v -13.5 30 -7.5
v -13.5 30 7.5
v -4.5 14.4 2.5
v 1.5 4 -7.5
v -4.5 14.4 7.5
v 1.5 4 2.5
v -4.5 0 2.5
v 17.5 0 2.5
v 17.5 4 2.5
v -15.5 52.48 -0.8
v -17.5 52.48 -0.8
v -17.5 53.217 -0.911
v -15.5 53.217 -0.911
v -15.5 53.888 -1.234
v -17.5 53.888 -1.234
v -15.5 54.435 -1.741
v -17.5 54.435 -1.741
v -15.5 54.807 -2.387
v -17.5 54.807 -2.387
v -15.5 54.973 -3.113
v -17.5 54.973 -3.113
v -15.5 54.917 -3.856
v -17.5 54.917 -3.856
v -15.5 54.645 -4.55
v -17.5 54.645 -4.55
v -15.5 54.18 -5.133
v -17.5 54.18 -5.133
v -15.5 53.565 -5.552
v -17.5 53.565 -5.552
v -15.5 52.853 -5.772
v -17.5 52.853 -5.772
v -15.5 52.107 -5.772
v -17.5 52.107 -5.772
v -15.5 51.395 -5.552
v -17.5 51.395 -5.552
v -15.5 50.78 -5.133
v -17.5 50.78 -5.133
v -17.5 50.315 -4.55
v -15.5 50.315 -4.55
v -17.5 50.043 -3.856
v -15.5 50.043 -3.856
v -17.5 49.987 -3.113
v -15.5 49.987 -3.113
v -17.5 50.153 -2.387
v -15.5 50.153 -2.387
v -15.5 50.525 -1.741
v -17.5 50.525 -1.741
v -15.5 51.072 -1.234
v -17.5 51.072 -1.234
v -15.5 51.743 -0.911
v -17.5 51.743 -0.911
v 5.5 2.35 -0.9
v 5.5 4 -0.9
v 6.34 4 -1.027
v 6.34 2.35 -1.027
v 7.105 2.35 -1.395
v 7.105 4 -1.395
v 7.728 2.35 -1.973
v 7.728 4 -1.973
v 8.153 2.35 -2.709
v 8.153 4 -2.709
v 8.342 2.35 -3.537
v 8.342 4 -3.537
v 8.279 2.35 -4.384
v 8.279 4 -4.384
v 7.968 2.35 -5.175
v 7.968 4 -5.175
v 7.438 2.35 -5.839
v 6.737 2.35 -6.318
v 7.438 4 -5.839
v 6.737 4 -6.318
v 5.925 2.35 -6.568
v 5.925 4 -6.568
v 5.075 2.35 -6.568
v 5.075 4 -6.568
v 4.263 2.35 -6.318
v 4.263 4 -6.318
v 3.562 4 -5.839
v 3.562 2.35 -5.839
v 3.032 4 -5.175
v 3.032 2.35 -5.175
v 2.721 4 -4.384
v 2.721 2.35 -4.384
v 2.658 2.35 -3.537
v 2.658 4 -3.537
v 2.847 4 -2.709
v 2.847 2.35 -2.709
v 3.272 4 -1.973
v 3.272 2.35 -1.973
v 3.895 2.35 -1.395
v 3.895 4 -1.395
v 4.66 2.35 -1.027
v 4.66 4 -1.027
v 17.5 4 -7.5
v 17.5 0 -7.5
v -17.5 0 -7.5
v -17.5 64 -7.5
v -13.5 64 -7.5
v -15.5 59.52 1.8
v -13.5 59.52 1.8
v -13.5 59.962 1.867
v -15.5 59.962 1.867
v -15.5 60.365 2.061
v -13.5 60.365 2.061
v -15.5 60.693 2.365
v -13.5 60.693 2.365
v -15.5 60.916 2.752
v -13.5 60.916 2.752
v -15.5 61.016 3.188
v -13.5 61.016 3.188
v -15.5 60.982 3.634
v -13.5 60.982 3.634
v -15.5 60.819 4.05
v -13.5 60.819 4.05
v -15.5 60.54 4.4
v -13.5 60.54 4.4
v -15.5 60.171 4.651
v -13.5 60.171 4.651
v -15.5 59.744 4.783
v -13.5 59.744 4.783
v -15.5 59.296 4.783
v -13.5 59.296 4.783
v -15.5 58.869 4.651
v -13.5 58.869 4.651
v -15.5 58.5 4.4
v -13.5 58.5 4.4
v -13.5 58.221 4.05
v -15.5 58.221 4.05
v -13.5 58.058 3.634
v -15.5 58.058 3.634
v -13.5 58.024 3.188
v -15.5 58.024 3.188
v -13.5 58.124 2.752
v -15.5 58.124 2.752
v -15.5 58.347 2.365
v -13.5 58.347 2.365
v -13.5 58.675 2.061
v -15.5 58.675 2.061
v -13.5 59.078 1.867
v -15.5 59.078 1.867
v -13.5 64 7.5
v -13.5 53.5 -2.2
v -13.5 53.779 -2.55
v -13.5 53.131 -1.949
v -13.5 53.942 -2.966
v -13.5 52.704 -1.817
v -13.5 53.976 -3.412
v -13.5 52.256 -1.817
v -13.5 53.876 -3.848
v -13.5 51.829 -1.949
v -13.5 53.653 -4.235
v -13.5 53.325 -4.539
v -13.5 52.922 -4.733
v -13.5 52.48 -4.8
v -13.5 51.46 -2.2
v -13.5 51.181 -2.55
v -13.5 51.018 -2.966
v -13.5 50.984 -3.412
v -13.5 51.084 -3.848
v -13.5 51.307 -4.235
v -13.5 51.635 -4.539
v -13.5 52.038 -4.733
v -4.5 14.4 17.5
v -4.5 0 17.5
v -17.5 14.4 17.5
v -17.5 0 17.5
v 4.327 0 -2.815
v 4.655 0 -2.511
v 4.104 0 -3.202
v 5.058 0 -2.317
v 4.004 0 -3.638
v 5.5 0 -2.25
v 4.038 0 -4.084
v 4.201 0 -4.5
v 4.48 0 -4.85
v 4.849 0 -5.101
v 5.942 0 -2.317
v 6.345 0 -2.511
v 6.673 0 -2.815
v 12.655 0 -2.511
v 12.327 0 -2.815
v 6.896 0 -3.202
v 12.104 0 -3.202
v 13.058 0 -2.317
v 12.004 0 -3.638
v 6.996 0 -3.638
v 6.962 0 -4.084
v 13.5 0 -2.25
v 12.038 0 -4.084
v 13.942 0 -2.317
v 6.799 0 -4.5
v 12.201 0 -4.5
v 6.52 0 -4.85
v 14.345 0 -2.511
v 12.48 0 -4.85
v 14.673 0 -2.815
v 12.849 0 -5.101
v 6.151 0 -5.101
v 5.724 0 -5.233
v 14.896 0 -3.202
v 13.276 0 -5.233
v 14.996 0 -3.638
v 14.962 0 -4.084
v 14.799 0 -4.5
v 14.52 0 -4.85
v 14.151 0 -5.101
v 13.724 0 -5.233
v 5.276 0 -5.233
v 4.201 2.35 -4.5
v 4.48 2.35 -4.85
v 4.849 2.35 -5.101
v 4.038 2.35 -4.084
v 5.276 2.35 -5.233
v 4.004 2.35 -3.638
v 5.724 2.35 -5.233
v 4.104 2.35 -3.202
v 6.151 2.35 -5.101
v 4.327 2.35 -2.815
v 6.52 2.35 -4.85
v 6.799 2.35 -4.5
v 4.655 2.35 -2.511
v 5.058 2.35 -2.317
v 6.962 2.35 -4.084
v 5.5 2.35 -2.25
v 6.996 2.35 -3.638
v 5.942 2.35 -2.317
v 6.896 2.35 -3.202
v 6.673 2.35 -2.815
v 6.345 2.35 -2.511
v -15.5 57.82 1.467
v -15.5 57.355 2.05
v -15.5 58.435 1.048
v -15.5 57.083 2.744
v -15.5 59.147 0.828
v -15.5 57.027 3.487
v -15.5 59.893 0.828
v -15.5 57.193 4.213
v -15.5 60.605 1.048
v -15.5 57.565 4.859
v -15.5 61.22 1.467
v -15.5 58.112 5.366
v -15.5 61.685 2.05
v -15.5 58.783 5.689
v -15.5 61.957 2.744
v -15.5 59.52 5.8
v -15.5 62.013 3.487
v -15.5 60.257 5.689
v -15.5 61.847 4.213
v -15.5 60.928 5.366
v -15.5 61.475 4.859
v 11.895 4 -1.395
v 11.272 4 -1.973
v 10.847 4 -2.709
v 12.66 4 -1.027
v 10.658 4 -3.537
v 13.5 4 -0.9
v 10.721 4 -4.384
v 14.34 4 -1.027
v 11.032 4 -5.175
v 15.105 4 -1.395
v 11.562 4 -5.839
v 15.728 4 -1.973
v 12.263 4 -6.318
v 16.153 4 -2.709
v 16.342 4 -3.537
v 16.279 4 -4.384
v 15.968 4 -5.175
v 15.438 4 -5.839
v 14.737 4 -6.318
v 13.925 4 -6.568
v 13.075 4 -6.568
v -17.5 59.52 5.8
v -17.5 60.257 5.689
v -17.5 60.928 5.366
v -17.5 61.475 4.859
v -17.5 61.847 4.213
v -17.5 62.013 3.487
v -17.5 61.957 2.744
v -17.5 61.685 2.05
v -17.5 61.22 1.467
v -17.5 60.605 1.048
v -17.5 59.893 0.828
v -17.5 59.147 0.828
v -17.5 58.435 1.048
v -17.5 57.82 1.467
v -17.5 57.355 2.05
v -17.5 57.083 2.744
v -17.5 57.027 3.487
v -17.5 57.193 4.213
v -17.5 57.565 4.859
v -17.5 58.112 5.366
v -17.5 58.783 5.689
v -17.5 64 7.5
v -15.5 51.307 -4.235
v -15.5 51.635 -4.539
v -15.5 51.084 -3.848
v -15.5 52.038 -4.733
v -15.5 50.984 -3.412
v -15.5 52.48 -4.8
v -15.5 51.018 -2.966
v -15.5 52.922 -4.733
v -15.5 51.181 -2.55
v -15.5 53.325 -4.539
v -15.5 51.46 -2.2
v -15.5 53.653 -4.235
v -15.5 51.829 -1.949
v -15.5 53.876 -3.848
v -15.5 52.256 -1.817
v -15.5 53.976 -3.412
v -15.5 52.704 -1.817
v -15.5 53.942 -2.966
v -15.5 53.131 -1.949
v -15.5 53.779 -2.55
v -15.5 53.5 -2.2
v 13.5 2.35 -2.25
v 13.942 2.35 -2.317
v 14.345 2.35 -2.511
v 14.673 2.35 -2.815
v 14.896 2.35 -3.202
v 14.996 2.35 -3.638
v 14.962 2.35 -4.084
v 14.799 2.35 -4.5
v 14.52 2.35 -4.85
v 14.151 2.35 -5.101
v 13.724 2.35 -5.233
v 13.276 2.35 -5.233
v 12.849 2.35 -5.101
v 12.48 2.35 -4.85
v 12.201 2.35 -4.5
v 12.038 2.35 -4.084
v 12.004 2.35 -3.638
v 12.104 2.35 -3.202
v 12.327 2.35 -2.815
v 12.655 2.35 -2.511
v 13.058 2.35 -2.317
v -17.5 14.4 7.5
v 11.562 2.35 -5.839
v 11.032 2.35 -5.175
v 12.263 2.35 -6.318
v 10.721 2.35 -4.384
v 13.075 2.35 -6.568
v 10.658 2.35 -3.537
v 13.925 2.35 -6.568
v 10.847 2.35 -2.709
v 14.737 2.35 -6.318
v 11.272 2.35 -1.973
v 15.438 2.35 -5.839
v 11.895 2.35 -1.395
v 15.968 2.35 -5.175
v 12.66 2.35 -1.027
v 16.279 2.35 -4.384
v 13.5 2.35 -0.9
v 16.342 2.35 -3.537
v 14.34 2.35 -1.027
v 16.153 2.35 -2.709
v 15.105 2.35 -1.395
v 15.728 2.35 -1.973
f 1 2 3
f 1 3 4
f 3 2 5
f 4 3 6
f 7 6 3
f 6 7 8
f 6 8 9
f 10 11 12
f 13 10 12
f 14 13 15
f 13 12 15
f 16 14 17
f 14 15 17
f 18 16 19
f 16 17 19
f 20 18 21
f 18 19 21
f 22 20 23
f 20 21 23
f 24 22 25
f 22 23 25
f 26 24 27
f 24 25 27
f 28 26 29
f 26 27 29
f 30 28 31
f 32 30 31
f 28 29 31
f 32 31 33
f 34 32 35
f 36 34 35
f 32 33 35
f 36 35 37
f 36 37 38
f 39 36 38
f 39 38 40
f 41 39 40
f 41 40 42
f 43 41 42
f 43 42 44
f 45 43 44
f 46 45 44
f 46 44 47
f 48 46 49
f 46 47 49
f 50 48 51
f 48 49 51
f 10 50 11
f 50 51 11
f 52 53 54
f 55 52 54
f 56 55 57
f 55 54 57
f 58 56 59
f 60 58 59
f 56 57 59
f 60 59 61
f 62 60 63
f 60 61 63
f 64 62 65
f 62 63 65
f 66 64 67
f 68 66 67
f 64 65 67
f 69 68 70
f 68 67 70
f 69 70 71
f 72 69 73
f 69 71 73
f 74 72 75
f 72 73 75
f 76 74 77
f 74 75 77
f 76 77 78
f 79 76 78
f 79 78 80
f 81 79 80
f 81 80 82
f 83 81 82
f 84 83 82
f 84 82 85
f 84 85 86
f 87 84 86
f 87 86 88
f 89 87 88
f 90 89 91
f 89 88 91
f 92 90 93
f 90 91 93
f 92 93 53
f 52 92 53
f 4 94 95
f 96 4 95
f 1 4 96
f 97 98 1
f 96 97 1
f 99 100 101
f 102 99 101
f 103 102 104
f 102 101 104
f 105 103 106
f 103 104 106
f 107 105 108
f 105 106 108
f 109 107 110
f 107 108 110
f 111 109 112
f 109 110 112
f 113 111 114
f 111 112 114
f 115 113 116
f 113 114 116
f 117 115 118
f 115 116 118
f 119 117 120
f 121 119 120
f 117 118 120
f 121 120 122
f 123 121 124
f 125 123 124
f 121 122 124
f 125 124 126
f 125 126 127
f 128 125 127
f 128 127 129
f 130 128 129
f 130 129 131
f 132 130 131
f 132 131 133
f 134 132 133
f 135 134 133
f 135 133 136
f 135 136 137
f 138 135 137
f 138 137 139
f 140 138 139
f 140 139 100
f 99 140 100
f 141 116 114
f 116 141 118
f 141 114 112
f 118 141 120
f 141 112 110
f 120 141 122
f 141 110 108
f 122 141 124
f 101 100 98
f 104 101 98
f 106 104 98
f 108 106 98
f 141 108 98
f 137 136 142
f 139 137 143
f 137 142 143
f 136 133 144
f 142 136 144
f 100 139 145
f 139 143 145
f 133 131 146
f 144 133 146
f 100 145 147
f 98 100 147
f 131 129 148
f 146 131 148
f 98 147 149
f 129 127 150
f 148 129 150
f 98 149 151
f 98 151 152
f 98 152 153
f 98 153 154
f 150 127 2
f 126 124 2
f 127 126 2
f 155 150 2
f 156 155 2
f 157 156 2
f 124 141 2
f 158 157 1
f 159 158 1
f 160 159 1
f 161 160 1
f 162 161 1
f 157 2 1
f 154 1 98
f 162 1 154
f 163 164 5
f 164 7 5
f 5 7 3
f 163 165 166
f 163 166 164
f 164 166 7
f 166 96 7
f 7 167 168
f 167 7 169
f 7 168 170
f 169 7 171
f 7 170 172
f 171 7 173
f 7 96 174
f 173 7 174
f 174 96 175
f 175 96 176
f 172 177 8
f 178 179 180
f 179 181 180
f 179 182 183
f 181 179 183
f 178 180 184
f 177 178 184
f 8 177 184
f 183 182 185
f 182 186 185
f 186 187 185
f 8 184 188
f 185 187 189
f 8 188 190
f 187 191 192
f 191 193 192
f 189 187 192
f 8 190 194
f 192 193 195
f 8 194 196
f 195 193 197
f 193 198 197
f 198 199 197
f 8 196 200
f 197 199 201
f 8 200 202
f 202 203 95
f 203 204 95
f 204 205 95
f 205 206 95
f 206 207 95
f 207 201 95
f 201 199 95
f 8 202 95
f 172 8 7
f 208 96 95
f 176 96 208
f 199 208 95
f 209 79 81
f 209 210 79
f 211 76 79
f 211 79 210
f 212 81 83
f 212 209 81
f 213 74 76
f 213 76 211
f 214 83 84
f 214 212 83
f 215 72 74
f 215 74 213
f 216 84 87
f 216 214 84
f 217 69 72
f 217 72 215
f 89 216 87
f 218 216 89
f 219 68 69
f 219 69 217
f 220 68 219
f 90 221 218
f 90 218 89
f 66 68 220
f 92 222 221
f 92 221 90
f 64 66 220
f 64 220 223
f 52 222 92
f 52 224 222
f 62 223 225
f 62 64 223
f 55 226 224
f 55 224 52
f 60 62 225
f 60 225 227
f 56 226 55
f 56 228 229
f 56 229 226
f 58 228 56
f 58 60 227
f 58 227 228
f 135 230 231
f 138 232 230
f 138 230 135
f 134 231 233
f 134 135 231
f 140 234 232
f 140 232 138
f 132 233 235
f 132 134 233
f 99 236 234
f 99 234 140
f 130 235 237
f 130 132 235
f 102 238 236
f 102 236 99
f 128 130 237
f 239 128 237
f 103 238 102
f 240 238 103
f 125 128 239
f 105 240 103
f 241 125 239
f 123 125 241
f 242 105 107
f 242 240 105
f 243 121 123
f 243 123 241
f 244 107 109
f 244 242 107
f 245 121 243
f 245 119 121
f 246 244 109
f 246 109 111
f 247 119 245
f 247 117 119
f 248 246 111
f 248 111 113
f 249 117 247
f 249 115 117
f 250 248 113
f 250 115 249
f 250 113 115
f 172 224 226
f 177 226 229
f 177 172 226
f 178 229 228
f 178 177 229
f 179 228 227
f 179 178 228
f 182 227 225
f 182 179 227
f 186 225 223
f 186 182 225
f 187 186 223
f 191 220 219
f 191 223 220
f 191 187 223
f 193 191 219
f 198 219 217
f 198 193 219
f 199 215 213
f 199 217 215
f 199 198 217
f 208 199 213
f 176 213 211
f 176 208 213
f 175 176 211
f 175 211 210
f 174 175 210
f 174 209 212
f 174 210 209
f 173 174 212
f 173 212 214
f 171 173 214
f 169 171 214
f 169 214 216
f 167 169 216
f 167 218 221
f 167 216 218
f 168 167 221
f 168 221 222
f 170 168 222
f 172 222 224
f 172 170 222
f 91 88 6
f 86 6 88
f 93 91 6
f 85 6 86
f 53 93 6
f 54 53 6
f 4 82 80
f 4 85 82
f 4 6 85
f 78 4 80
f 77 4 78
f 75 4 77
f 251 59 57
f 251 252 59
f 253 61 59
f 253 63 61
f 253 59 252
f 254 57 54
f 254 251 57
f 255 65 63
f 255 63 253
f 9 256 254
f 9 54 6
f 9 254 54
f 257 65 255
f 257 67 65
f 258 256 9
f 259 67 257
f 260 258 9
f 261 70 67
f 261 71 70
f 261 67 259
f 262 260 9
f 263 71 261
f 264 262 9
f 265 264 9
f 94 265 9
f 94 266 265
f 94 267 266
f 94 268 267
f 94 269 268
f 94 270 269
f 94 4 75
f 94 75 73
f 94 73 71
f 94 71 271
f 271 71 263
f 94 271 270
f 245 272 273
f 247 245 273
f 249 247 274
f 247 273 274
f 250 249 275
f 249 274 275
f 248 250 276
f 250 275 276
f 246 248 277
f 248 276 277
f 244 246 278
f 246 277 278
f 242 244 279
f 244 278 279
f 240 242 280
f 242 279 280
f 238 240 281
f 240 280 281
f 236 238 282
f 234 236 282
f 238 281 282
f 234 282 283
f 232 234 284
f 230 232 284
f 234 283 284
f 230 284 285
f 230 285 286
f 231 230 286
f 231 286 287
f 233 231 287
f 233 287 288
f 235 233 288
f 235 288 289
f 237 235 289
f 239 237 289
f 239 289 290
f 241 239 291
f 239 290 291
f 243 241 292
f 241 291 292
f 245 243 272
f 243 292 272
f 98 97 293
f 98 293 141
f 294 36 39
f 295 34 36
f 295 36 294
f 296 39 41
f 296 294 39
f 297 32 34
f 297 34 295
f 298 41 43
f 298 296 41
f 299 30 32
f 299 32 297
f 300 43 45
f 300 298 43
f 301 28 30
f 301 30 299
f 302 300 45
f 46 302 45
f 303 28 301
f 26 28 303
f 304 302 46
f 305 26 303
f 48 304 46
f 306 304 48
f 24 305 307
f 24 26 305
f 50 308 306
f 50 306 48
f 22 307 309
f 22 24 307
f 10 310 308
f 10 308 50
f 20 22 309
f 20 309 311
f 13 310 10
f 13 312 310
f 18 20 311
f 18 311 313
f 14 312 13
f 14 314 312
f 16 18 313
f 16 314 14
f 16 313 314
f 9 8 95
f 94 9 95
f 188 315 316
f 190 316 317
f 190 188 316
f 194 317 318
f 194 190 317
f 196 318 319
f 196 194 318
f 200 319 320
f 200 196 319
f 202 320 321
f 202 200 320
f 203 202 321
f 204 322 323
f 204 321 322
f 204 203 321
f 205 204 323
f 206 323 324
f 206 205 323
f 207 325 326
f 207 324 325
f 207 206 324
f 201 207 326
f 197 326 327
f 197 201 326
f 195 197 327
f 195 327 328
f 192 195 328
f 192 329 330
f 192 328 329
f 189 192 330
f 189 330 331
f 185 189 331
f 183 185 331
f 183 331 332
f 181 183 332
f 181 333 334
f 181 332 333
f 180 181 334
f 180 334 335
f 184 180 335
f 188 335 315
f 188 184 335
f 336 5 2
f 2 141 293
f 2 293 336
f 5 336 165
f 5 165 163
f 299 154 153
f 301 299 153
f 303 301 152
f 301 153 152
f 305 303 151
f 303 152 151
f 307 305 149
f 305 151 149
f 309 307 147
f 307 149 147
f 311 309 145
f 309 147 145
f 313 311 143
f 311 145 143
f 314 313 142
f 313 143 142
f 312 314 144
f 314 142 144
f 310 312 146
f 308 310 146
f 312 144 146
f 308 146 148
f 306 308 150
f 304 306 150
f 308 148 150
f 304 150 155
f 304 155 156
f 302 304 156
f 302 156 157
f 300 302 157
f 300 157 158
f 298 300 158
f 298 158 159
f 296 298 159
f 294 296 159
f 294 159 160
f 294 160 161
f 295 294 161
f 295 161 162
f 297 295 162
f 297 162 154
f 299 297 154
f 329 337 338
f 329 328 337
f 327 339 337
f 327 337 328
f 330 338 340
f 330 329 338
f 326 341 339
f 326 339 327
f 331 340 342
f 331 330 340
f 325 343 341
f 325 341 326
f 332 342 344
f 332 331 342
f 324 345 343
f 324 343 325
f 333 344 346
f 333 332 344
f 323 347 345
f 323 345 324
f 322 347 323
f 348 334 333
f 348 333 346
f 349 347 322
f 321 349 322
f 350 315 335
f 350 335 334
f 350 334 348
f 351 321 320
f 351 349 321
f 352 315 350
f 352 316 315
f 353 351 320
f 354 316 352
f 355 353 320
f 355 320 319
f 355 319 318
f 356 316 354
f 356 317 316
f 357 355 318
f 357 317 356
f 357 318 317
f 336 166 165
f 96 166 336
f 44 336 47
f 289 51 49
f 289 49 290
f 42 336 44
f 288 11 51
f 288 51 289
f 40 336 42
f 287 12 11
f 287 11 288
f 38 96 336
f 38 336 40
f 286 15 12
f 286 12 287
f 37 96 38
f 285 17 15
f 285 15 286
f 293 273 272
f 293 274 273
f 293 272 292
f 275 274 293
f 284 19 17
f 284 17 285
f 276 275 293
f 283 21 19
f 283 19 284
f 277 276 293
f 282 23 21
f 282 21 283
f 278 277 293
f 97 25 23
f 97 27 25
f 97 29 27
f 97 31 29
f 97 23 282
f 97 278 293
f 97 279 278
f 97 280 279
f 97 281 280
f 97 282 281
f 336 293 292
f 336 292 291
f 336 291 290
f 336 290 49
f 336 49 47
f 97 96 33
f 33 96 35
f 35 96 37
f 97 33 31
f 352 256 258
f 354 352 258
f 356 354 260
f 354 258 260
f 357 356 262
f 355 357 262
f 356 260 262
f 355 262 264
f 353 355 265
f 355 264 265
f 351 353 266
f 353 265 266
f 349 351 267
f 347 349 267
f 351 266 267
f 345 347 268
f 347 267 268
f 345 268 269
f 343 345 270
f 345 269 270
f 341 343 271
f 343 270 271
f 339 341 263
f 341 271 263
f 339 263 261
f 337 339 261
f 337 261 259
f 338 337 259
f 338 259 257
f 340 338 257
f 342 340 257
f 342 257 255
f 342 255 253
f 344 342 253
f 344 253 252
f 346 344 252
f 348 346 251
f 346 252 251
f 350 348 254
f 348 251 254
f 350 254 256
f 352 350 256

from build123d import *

# Parameters (mm, degrees)
CROQUIS1_W              = 35
CROQUIS1_H              = 15
CROQUIS1_R              = 1.5
SALIENTE_EXTRUIR1_DEPTH = 4
CROQUIS2_W              = 4
CROQUIS2_H              = 15
SALIENTE_EXTRUIR2_DEPTH = 60
SALIENTE_EXTRUIR3_DEPTH = 15
CROQUIS4_R              = 2.85
CORTAR_EXTRUIR1_DEPTH   = 1.65
CROQUIS5_W              = 5
CROQUIS5_H              = 22
CORTAR_EXTRUIR2_DEPTH   = 22
CORTAR_EXTRUIR5_REACH   = 73.507
CROQUIS6_R              = 1.5
CROQUIS7_R              = 2.5
CORTAR_EXTRUIR6_DEPTH   = 2
CROQUIS9_W              = 13
CROQUIS9_H              = 14.4
SALIENTE_EXTRUIR4_DEPTH = 10


with BuildPart() as part:
    # Croquis1 → Saliente-Extruir1 (new body)
    with BuildSketch(Plane(origin=(0, 0, 0), x_dir=(1, 0, 0), z_dir=(0, 1, 0))):
        Rectangle(CROQUIS1_W, CROQUIS1_H)
        with Locations(Location((5.5, 3.75, 0), (0, 0, 270))):
            Circle(CROQUIS1_R, mode=Mode.SUBTRACT)
        with Locations(Location((13.5, 3.75, 0), (0, 0, 270))):
            Circle(CROQUIS1_R, mode=Mode.SUBTRACT)
    extrude(amount=SALIENTE_EXTRUIR1_DEPTH)

    # Croquis2 → Saliente-Extruir2 (add)
    with BuildSketch(Plane(origin=(0, 4, 0), x_dir=(1, 0, 0), z_dir=(0, 1, 0))):
        with Locations((-15.5, 0)):
            Rectangle(CROQUIS2_W, CROQUIS2_H)
    extrude(amount=SALIENTE_EXTRUIR2_DEPTH)

    # Croquis3 → Saliente-Extruir3 (add)
    with BuildSketch(Plane.XY.offset(7.5)):
        Polygon((-13.5, 4), (-13.5, 30), (1.5, 4), align=None)
    extrude(amount=-SALIENTE_EXTRUIR3_DEPTH)

    # Croquis4 → Cortar-Extruir1 (cut)
    with BuildSketch(Plane(origin=(0, 4, 0), x_dir=(1, 0, 0), z_dir=(0, 1, 0))):
        with Locations(Location((5.5, 3.75, 0), (0, 0, 270))):
            Circle(CROQUIS4_R)
        with Locations(Location((13.5, 3.75, 0), (0, 0, 270))):
            Circle(CROQUIS4_R)
    extrude(amount=-CORTAR_EXTRUIR1_DEPTH, mode=Mode.SUBTRACT)

    # Croquis5 → Cortar-Extruir2 (cut)
    with BuildSketch(Plane(origin=(17.5, 0, 0), x_dir=(0, 0, -1), z_dir=(1, 0, 0))):
        with Locations((-5, 11)):
            Rectangle(CROQUIS5_W, CROQUIS5_H)
    extrude(amount=-CORTAR_EXTRUIR2_DEPTH, mode=Mode.SUBTRACT)

    # Croquis6 → Cortar-Extruir5 (cut, up to next)
    with BuildSketch(Plane(origin=(-13.5, 0, 0), x_dir=(0, 0, -1), z_dir=(1, 0, 0)), mode=Mode.PRIVATE) as cortar_extruir5_sk1:
        with Locations((-3.3, 59.52)):
            Circle(CROQUIS6_R)
    cortar_extruir5_tool1 = extrude(cortar_extruir5_sk1.sketch, amount=-CORTAR_EXTRUIR5_REACH, mode=Mode.PRIVATE) & part.part
    # Croquis6 → Cortar-Extruir5 (cut, up to next)
    with BuildSketch(Plane(origin=(-13.5, 0, 0), x_dir=(0, 0, -1), z_dir=(1, 0, 0)), mode=Mode.PRIVATE) as cortar_extruir5_sk2:
        with Locations((3.3, 52.48)):
            Circle(CROQUIS6_R)
    cortar_extruir5_tool2 = extrude(cortar_extruir5_sk2.sketch, amount=-CORTAR_EXTRUIR5_REACH, mode=Mode.PRIVATE) & part.part
    add(cortar_extruir5_tool1.solids().sort_by_distance((-13.5, 59.52, 3.3))[0], mode=Mode.SUBTRACT)
    add(cortar_extruir5_tool2.solids().sort_by_distance((-13.5, 52.48, -3.3))[0], mode=Mode.SUBTRACT)

    # Croquis7 → Cortar-Extruir6 (cut)
    with BuildSketch(Plane.ZY.offset(17.5)):
        with Locations((-3.3, 52.48)):
            Circle(CROQUIS7_R)
        with Locations((3.3, 59.52)):
            Circle(CROQUIS7_R)
    extrude(amount=-CORTAR_EXTRUIR6_DEPTH, mode=Mode.SUBTRACT)

    # Croquis9 → Saliente-Extruir4 (add)
    with BuildSketch(Plane.XY.offset(7.5)):
        with Locations((-11, 7.2)):
            Rectangle(CROQUIS9_W, CROQUIS9_H)
    extrude(amount=SALIENTE_EXTRUIR4_DEPTH)


solid = part.part
